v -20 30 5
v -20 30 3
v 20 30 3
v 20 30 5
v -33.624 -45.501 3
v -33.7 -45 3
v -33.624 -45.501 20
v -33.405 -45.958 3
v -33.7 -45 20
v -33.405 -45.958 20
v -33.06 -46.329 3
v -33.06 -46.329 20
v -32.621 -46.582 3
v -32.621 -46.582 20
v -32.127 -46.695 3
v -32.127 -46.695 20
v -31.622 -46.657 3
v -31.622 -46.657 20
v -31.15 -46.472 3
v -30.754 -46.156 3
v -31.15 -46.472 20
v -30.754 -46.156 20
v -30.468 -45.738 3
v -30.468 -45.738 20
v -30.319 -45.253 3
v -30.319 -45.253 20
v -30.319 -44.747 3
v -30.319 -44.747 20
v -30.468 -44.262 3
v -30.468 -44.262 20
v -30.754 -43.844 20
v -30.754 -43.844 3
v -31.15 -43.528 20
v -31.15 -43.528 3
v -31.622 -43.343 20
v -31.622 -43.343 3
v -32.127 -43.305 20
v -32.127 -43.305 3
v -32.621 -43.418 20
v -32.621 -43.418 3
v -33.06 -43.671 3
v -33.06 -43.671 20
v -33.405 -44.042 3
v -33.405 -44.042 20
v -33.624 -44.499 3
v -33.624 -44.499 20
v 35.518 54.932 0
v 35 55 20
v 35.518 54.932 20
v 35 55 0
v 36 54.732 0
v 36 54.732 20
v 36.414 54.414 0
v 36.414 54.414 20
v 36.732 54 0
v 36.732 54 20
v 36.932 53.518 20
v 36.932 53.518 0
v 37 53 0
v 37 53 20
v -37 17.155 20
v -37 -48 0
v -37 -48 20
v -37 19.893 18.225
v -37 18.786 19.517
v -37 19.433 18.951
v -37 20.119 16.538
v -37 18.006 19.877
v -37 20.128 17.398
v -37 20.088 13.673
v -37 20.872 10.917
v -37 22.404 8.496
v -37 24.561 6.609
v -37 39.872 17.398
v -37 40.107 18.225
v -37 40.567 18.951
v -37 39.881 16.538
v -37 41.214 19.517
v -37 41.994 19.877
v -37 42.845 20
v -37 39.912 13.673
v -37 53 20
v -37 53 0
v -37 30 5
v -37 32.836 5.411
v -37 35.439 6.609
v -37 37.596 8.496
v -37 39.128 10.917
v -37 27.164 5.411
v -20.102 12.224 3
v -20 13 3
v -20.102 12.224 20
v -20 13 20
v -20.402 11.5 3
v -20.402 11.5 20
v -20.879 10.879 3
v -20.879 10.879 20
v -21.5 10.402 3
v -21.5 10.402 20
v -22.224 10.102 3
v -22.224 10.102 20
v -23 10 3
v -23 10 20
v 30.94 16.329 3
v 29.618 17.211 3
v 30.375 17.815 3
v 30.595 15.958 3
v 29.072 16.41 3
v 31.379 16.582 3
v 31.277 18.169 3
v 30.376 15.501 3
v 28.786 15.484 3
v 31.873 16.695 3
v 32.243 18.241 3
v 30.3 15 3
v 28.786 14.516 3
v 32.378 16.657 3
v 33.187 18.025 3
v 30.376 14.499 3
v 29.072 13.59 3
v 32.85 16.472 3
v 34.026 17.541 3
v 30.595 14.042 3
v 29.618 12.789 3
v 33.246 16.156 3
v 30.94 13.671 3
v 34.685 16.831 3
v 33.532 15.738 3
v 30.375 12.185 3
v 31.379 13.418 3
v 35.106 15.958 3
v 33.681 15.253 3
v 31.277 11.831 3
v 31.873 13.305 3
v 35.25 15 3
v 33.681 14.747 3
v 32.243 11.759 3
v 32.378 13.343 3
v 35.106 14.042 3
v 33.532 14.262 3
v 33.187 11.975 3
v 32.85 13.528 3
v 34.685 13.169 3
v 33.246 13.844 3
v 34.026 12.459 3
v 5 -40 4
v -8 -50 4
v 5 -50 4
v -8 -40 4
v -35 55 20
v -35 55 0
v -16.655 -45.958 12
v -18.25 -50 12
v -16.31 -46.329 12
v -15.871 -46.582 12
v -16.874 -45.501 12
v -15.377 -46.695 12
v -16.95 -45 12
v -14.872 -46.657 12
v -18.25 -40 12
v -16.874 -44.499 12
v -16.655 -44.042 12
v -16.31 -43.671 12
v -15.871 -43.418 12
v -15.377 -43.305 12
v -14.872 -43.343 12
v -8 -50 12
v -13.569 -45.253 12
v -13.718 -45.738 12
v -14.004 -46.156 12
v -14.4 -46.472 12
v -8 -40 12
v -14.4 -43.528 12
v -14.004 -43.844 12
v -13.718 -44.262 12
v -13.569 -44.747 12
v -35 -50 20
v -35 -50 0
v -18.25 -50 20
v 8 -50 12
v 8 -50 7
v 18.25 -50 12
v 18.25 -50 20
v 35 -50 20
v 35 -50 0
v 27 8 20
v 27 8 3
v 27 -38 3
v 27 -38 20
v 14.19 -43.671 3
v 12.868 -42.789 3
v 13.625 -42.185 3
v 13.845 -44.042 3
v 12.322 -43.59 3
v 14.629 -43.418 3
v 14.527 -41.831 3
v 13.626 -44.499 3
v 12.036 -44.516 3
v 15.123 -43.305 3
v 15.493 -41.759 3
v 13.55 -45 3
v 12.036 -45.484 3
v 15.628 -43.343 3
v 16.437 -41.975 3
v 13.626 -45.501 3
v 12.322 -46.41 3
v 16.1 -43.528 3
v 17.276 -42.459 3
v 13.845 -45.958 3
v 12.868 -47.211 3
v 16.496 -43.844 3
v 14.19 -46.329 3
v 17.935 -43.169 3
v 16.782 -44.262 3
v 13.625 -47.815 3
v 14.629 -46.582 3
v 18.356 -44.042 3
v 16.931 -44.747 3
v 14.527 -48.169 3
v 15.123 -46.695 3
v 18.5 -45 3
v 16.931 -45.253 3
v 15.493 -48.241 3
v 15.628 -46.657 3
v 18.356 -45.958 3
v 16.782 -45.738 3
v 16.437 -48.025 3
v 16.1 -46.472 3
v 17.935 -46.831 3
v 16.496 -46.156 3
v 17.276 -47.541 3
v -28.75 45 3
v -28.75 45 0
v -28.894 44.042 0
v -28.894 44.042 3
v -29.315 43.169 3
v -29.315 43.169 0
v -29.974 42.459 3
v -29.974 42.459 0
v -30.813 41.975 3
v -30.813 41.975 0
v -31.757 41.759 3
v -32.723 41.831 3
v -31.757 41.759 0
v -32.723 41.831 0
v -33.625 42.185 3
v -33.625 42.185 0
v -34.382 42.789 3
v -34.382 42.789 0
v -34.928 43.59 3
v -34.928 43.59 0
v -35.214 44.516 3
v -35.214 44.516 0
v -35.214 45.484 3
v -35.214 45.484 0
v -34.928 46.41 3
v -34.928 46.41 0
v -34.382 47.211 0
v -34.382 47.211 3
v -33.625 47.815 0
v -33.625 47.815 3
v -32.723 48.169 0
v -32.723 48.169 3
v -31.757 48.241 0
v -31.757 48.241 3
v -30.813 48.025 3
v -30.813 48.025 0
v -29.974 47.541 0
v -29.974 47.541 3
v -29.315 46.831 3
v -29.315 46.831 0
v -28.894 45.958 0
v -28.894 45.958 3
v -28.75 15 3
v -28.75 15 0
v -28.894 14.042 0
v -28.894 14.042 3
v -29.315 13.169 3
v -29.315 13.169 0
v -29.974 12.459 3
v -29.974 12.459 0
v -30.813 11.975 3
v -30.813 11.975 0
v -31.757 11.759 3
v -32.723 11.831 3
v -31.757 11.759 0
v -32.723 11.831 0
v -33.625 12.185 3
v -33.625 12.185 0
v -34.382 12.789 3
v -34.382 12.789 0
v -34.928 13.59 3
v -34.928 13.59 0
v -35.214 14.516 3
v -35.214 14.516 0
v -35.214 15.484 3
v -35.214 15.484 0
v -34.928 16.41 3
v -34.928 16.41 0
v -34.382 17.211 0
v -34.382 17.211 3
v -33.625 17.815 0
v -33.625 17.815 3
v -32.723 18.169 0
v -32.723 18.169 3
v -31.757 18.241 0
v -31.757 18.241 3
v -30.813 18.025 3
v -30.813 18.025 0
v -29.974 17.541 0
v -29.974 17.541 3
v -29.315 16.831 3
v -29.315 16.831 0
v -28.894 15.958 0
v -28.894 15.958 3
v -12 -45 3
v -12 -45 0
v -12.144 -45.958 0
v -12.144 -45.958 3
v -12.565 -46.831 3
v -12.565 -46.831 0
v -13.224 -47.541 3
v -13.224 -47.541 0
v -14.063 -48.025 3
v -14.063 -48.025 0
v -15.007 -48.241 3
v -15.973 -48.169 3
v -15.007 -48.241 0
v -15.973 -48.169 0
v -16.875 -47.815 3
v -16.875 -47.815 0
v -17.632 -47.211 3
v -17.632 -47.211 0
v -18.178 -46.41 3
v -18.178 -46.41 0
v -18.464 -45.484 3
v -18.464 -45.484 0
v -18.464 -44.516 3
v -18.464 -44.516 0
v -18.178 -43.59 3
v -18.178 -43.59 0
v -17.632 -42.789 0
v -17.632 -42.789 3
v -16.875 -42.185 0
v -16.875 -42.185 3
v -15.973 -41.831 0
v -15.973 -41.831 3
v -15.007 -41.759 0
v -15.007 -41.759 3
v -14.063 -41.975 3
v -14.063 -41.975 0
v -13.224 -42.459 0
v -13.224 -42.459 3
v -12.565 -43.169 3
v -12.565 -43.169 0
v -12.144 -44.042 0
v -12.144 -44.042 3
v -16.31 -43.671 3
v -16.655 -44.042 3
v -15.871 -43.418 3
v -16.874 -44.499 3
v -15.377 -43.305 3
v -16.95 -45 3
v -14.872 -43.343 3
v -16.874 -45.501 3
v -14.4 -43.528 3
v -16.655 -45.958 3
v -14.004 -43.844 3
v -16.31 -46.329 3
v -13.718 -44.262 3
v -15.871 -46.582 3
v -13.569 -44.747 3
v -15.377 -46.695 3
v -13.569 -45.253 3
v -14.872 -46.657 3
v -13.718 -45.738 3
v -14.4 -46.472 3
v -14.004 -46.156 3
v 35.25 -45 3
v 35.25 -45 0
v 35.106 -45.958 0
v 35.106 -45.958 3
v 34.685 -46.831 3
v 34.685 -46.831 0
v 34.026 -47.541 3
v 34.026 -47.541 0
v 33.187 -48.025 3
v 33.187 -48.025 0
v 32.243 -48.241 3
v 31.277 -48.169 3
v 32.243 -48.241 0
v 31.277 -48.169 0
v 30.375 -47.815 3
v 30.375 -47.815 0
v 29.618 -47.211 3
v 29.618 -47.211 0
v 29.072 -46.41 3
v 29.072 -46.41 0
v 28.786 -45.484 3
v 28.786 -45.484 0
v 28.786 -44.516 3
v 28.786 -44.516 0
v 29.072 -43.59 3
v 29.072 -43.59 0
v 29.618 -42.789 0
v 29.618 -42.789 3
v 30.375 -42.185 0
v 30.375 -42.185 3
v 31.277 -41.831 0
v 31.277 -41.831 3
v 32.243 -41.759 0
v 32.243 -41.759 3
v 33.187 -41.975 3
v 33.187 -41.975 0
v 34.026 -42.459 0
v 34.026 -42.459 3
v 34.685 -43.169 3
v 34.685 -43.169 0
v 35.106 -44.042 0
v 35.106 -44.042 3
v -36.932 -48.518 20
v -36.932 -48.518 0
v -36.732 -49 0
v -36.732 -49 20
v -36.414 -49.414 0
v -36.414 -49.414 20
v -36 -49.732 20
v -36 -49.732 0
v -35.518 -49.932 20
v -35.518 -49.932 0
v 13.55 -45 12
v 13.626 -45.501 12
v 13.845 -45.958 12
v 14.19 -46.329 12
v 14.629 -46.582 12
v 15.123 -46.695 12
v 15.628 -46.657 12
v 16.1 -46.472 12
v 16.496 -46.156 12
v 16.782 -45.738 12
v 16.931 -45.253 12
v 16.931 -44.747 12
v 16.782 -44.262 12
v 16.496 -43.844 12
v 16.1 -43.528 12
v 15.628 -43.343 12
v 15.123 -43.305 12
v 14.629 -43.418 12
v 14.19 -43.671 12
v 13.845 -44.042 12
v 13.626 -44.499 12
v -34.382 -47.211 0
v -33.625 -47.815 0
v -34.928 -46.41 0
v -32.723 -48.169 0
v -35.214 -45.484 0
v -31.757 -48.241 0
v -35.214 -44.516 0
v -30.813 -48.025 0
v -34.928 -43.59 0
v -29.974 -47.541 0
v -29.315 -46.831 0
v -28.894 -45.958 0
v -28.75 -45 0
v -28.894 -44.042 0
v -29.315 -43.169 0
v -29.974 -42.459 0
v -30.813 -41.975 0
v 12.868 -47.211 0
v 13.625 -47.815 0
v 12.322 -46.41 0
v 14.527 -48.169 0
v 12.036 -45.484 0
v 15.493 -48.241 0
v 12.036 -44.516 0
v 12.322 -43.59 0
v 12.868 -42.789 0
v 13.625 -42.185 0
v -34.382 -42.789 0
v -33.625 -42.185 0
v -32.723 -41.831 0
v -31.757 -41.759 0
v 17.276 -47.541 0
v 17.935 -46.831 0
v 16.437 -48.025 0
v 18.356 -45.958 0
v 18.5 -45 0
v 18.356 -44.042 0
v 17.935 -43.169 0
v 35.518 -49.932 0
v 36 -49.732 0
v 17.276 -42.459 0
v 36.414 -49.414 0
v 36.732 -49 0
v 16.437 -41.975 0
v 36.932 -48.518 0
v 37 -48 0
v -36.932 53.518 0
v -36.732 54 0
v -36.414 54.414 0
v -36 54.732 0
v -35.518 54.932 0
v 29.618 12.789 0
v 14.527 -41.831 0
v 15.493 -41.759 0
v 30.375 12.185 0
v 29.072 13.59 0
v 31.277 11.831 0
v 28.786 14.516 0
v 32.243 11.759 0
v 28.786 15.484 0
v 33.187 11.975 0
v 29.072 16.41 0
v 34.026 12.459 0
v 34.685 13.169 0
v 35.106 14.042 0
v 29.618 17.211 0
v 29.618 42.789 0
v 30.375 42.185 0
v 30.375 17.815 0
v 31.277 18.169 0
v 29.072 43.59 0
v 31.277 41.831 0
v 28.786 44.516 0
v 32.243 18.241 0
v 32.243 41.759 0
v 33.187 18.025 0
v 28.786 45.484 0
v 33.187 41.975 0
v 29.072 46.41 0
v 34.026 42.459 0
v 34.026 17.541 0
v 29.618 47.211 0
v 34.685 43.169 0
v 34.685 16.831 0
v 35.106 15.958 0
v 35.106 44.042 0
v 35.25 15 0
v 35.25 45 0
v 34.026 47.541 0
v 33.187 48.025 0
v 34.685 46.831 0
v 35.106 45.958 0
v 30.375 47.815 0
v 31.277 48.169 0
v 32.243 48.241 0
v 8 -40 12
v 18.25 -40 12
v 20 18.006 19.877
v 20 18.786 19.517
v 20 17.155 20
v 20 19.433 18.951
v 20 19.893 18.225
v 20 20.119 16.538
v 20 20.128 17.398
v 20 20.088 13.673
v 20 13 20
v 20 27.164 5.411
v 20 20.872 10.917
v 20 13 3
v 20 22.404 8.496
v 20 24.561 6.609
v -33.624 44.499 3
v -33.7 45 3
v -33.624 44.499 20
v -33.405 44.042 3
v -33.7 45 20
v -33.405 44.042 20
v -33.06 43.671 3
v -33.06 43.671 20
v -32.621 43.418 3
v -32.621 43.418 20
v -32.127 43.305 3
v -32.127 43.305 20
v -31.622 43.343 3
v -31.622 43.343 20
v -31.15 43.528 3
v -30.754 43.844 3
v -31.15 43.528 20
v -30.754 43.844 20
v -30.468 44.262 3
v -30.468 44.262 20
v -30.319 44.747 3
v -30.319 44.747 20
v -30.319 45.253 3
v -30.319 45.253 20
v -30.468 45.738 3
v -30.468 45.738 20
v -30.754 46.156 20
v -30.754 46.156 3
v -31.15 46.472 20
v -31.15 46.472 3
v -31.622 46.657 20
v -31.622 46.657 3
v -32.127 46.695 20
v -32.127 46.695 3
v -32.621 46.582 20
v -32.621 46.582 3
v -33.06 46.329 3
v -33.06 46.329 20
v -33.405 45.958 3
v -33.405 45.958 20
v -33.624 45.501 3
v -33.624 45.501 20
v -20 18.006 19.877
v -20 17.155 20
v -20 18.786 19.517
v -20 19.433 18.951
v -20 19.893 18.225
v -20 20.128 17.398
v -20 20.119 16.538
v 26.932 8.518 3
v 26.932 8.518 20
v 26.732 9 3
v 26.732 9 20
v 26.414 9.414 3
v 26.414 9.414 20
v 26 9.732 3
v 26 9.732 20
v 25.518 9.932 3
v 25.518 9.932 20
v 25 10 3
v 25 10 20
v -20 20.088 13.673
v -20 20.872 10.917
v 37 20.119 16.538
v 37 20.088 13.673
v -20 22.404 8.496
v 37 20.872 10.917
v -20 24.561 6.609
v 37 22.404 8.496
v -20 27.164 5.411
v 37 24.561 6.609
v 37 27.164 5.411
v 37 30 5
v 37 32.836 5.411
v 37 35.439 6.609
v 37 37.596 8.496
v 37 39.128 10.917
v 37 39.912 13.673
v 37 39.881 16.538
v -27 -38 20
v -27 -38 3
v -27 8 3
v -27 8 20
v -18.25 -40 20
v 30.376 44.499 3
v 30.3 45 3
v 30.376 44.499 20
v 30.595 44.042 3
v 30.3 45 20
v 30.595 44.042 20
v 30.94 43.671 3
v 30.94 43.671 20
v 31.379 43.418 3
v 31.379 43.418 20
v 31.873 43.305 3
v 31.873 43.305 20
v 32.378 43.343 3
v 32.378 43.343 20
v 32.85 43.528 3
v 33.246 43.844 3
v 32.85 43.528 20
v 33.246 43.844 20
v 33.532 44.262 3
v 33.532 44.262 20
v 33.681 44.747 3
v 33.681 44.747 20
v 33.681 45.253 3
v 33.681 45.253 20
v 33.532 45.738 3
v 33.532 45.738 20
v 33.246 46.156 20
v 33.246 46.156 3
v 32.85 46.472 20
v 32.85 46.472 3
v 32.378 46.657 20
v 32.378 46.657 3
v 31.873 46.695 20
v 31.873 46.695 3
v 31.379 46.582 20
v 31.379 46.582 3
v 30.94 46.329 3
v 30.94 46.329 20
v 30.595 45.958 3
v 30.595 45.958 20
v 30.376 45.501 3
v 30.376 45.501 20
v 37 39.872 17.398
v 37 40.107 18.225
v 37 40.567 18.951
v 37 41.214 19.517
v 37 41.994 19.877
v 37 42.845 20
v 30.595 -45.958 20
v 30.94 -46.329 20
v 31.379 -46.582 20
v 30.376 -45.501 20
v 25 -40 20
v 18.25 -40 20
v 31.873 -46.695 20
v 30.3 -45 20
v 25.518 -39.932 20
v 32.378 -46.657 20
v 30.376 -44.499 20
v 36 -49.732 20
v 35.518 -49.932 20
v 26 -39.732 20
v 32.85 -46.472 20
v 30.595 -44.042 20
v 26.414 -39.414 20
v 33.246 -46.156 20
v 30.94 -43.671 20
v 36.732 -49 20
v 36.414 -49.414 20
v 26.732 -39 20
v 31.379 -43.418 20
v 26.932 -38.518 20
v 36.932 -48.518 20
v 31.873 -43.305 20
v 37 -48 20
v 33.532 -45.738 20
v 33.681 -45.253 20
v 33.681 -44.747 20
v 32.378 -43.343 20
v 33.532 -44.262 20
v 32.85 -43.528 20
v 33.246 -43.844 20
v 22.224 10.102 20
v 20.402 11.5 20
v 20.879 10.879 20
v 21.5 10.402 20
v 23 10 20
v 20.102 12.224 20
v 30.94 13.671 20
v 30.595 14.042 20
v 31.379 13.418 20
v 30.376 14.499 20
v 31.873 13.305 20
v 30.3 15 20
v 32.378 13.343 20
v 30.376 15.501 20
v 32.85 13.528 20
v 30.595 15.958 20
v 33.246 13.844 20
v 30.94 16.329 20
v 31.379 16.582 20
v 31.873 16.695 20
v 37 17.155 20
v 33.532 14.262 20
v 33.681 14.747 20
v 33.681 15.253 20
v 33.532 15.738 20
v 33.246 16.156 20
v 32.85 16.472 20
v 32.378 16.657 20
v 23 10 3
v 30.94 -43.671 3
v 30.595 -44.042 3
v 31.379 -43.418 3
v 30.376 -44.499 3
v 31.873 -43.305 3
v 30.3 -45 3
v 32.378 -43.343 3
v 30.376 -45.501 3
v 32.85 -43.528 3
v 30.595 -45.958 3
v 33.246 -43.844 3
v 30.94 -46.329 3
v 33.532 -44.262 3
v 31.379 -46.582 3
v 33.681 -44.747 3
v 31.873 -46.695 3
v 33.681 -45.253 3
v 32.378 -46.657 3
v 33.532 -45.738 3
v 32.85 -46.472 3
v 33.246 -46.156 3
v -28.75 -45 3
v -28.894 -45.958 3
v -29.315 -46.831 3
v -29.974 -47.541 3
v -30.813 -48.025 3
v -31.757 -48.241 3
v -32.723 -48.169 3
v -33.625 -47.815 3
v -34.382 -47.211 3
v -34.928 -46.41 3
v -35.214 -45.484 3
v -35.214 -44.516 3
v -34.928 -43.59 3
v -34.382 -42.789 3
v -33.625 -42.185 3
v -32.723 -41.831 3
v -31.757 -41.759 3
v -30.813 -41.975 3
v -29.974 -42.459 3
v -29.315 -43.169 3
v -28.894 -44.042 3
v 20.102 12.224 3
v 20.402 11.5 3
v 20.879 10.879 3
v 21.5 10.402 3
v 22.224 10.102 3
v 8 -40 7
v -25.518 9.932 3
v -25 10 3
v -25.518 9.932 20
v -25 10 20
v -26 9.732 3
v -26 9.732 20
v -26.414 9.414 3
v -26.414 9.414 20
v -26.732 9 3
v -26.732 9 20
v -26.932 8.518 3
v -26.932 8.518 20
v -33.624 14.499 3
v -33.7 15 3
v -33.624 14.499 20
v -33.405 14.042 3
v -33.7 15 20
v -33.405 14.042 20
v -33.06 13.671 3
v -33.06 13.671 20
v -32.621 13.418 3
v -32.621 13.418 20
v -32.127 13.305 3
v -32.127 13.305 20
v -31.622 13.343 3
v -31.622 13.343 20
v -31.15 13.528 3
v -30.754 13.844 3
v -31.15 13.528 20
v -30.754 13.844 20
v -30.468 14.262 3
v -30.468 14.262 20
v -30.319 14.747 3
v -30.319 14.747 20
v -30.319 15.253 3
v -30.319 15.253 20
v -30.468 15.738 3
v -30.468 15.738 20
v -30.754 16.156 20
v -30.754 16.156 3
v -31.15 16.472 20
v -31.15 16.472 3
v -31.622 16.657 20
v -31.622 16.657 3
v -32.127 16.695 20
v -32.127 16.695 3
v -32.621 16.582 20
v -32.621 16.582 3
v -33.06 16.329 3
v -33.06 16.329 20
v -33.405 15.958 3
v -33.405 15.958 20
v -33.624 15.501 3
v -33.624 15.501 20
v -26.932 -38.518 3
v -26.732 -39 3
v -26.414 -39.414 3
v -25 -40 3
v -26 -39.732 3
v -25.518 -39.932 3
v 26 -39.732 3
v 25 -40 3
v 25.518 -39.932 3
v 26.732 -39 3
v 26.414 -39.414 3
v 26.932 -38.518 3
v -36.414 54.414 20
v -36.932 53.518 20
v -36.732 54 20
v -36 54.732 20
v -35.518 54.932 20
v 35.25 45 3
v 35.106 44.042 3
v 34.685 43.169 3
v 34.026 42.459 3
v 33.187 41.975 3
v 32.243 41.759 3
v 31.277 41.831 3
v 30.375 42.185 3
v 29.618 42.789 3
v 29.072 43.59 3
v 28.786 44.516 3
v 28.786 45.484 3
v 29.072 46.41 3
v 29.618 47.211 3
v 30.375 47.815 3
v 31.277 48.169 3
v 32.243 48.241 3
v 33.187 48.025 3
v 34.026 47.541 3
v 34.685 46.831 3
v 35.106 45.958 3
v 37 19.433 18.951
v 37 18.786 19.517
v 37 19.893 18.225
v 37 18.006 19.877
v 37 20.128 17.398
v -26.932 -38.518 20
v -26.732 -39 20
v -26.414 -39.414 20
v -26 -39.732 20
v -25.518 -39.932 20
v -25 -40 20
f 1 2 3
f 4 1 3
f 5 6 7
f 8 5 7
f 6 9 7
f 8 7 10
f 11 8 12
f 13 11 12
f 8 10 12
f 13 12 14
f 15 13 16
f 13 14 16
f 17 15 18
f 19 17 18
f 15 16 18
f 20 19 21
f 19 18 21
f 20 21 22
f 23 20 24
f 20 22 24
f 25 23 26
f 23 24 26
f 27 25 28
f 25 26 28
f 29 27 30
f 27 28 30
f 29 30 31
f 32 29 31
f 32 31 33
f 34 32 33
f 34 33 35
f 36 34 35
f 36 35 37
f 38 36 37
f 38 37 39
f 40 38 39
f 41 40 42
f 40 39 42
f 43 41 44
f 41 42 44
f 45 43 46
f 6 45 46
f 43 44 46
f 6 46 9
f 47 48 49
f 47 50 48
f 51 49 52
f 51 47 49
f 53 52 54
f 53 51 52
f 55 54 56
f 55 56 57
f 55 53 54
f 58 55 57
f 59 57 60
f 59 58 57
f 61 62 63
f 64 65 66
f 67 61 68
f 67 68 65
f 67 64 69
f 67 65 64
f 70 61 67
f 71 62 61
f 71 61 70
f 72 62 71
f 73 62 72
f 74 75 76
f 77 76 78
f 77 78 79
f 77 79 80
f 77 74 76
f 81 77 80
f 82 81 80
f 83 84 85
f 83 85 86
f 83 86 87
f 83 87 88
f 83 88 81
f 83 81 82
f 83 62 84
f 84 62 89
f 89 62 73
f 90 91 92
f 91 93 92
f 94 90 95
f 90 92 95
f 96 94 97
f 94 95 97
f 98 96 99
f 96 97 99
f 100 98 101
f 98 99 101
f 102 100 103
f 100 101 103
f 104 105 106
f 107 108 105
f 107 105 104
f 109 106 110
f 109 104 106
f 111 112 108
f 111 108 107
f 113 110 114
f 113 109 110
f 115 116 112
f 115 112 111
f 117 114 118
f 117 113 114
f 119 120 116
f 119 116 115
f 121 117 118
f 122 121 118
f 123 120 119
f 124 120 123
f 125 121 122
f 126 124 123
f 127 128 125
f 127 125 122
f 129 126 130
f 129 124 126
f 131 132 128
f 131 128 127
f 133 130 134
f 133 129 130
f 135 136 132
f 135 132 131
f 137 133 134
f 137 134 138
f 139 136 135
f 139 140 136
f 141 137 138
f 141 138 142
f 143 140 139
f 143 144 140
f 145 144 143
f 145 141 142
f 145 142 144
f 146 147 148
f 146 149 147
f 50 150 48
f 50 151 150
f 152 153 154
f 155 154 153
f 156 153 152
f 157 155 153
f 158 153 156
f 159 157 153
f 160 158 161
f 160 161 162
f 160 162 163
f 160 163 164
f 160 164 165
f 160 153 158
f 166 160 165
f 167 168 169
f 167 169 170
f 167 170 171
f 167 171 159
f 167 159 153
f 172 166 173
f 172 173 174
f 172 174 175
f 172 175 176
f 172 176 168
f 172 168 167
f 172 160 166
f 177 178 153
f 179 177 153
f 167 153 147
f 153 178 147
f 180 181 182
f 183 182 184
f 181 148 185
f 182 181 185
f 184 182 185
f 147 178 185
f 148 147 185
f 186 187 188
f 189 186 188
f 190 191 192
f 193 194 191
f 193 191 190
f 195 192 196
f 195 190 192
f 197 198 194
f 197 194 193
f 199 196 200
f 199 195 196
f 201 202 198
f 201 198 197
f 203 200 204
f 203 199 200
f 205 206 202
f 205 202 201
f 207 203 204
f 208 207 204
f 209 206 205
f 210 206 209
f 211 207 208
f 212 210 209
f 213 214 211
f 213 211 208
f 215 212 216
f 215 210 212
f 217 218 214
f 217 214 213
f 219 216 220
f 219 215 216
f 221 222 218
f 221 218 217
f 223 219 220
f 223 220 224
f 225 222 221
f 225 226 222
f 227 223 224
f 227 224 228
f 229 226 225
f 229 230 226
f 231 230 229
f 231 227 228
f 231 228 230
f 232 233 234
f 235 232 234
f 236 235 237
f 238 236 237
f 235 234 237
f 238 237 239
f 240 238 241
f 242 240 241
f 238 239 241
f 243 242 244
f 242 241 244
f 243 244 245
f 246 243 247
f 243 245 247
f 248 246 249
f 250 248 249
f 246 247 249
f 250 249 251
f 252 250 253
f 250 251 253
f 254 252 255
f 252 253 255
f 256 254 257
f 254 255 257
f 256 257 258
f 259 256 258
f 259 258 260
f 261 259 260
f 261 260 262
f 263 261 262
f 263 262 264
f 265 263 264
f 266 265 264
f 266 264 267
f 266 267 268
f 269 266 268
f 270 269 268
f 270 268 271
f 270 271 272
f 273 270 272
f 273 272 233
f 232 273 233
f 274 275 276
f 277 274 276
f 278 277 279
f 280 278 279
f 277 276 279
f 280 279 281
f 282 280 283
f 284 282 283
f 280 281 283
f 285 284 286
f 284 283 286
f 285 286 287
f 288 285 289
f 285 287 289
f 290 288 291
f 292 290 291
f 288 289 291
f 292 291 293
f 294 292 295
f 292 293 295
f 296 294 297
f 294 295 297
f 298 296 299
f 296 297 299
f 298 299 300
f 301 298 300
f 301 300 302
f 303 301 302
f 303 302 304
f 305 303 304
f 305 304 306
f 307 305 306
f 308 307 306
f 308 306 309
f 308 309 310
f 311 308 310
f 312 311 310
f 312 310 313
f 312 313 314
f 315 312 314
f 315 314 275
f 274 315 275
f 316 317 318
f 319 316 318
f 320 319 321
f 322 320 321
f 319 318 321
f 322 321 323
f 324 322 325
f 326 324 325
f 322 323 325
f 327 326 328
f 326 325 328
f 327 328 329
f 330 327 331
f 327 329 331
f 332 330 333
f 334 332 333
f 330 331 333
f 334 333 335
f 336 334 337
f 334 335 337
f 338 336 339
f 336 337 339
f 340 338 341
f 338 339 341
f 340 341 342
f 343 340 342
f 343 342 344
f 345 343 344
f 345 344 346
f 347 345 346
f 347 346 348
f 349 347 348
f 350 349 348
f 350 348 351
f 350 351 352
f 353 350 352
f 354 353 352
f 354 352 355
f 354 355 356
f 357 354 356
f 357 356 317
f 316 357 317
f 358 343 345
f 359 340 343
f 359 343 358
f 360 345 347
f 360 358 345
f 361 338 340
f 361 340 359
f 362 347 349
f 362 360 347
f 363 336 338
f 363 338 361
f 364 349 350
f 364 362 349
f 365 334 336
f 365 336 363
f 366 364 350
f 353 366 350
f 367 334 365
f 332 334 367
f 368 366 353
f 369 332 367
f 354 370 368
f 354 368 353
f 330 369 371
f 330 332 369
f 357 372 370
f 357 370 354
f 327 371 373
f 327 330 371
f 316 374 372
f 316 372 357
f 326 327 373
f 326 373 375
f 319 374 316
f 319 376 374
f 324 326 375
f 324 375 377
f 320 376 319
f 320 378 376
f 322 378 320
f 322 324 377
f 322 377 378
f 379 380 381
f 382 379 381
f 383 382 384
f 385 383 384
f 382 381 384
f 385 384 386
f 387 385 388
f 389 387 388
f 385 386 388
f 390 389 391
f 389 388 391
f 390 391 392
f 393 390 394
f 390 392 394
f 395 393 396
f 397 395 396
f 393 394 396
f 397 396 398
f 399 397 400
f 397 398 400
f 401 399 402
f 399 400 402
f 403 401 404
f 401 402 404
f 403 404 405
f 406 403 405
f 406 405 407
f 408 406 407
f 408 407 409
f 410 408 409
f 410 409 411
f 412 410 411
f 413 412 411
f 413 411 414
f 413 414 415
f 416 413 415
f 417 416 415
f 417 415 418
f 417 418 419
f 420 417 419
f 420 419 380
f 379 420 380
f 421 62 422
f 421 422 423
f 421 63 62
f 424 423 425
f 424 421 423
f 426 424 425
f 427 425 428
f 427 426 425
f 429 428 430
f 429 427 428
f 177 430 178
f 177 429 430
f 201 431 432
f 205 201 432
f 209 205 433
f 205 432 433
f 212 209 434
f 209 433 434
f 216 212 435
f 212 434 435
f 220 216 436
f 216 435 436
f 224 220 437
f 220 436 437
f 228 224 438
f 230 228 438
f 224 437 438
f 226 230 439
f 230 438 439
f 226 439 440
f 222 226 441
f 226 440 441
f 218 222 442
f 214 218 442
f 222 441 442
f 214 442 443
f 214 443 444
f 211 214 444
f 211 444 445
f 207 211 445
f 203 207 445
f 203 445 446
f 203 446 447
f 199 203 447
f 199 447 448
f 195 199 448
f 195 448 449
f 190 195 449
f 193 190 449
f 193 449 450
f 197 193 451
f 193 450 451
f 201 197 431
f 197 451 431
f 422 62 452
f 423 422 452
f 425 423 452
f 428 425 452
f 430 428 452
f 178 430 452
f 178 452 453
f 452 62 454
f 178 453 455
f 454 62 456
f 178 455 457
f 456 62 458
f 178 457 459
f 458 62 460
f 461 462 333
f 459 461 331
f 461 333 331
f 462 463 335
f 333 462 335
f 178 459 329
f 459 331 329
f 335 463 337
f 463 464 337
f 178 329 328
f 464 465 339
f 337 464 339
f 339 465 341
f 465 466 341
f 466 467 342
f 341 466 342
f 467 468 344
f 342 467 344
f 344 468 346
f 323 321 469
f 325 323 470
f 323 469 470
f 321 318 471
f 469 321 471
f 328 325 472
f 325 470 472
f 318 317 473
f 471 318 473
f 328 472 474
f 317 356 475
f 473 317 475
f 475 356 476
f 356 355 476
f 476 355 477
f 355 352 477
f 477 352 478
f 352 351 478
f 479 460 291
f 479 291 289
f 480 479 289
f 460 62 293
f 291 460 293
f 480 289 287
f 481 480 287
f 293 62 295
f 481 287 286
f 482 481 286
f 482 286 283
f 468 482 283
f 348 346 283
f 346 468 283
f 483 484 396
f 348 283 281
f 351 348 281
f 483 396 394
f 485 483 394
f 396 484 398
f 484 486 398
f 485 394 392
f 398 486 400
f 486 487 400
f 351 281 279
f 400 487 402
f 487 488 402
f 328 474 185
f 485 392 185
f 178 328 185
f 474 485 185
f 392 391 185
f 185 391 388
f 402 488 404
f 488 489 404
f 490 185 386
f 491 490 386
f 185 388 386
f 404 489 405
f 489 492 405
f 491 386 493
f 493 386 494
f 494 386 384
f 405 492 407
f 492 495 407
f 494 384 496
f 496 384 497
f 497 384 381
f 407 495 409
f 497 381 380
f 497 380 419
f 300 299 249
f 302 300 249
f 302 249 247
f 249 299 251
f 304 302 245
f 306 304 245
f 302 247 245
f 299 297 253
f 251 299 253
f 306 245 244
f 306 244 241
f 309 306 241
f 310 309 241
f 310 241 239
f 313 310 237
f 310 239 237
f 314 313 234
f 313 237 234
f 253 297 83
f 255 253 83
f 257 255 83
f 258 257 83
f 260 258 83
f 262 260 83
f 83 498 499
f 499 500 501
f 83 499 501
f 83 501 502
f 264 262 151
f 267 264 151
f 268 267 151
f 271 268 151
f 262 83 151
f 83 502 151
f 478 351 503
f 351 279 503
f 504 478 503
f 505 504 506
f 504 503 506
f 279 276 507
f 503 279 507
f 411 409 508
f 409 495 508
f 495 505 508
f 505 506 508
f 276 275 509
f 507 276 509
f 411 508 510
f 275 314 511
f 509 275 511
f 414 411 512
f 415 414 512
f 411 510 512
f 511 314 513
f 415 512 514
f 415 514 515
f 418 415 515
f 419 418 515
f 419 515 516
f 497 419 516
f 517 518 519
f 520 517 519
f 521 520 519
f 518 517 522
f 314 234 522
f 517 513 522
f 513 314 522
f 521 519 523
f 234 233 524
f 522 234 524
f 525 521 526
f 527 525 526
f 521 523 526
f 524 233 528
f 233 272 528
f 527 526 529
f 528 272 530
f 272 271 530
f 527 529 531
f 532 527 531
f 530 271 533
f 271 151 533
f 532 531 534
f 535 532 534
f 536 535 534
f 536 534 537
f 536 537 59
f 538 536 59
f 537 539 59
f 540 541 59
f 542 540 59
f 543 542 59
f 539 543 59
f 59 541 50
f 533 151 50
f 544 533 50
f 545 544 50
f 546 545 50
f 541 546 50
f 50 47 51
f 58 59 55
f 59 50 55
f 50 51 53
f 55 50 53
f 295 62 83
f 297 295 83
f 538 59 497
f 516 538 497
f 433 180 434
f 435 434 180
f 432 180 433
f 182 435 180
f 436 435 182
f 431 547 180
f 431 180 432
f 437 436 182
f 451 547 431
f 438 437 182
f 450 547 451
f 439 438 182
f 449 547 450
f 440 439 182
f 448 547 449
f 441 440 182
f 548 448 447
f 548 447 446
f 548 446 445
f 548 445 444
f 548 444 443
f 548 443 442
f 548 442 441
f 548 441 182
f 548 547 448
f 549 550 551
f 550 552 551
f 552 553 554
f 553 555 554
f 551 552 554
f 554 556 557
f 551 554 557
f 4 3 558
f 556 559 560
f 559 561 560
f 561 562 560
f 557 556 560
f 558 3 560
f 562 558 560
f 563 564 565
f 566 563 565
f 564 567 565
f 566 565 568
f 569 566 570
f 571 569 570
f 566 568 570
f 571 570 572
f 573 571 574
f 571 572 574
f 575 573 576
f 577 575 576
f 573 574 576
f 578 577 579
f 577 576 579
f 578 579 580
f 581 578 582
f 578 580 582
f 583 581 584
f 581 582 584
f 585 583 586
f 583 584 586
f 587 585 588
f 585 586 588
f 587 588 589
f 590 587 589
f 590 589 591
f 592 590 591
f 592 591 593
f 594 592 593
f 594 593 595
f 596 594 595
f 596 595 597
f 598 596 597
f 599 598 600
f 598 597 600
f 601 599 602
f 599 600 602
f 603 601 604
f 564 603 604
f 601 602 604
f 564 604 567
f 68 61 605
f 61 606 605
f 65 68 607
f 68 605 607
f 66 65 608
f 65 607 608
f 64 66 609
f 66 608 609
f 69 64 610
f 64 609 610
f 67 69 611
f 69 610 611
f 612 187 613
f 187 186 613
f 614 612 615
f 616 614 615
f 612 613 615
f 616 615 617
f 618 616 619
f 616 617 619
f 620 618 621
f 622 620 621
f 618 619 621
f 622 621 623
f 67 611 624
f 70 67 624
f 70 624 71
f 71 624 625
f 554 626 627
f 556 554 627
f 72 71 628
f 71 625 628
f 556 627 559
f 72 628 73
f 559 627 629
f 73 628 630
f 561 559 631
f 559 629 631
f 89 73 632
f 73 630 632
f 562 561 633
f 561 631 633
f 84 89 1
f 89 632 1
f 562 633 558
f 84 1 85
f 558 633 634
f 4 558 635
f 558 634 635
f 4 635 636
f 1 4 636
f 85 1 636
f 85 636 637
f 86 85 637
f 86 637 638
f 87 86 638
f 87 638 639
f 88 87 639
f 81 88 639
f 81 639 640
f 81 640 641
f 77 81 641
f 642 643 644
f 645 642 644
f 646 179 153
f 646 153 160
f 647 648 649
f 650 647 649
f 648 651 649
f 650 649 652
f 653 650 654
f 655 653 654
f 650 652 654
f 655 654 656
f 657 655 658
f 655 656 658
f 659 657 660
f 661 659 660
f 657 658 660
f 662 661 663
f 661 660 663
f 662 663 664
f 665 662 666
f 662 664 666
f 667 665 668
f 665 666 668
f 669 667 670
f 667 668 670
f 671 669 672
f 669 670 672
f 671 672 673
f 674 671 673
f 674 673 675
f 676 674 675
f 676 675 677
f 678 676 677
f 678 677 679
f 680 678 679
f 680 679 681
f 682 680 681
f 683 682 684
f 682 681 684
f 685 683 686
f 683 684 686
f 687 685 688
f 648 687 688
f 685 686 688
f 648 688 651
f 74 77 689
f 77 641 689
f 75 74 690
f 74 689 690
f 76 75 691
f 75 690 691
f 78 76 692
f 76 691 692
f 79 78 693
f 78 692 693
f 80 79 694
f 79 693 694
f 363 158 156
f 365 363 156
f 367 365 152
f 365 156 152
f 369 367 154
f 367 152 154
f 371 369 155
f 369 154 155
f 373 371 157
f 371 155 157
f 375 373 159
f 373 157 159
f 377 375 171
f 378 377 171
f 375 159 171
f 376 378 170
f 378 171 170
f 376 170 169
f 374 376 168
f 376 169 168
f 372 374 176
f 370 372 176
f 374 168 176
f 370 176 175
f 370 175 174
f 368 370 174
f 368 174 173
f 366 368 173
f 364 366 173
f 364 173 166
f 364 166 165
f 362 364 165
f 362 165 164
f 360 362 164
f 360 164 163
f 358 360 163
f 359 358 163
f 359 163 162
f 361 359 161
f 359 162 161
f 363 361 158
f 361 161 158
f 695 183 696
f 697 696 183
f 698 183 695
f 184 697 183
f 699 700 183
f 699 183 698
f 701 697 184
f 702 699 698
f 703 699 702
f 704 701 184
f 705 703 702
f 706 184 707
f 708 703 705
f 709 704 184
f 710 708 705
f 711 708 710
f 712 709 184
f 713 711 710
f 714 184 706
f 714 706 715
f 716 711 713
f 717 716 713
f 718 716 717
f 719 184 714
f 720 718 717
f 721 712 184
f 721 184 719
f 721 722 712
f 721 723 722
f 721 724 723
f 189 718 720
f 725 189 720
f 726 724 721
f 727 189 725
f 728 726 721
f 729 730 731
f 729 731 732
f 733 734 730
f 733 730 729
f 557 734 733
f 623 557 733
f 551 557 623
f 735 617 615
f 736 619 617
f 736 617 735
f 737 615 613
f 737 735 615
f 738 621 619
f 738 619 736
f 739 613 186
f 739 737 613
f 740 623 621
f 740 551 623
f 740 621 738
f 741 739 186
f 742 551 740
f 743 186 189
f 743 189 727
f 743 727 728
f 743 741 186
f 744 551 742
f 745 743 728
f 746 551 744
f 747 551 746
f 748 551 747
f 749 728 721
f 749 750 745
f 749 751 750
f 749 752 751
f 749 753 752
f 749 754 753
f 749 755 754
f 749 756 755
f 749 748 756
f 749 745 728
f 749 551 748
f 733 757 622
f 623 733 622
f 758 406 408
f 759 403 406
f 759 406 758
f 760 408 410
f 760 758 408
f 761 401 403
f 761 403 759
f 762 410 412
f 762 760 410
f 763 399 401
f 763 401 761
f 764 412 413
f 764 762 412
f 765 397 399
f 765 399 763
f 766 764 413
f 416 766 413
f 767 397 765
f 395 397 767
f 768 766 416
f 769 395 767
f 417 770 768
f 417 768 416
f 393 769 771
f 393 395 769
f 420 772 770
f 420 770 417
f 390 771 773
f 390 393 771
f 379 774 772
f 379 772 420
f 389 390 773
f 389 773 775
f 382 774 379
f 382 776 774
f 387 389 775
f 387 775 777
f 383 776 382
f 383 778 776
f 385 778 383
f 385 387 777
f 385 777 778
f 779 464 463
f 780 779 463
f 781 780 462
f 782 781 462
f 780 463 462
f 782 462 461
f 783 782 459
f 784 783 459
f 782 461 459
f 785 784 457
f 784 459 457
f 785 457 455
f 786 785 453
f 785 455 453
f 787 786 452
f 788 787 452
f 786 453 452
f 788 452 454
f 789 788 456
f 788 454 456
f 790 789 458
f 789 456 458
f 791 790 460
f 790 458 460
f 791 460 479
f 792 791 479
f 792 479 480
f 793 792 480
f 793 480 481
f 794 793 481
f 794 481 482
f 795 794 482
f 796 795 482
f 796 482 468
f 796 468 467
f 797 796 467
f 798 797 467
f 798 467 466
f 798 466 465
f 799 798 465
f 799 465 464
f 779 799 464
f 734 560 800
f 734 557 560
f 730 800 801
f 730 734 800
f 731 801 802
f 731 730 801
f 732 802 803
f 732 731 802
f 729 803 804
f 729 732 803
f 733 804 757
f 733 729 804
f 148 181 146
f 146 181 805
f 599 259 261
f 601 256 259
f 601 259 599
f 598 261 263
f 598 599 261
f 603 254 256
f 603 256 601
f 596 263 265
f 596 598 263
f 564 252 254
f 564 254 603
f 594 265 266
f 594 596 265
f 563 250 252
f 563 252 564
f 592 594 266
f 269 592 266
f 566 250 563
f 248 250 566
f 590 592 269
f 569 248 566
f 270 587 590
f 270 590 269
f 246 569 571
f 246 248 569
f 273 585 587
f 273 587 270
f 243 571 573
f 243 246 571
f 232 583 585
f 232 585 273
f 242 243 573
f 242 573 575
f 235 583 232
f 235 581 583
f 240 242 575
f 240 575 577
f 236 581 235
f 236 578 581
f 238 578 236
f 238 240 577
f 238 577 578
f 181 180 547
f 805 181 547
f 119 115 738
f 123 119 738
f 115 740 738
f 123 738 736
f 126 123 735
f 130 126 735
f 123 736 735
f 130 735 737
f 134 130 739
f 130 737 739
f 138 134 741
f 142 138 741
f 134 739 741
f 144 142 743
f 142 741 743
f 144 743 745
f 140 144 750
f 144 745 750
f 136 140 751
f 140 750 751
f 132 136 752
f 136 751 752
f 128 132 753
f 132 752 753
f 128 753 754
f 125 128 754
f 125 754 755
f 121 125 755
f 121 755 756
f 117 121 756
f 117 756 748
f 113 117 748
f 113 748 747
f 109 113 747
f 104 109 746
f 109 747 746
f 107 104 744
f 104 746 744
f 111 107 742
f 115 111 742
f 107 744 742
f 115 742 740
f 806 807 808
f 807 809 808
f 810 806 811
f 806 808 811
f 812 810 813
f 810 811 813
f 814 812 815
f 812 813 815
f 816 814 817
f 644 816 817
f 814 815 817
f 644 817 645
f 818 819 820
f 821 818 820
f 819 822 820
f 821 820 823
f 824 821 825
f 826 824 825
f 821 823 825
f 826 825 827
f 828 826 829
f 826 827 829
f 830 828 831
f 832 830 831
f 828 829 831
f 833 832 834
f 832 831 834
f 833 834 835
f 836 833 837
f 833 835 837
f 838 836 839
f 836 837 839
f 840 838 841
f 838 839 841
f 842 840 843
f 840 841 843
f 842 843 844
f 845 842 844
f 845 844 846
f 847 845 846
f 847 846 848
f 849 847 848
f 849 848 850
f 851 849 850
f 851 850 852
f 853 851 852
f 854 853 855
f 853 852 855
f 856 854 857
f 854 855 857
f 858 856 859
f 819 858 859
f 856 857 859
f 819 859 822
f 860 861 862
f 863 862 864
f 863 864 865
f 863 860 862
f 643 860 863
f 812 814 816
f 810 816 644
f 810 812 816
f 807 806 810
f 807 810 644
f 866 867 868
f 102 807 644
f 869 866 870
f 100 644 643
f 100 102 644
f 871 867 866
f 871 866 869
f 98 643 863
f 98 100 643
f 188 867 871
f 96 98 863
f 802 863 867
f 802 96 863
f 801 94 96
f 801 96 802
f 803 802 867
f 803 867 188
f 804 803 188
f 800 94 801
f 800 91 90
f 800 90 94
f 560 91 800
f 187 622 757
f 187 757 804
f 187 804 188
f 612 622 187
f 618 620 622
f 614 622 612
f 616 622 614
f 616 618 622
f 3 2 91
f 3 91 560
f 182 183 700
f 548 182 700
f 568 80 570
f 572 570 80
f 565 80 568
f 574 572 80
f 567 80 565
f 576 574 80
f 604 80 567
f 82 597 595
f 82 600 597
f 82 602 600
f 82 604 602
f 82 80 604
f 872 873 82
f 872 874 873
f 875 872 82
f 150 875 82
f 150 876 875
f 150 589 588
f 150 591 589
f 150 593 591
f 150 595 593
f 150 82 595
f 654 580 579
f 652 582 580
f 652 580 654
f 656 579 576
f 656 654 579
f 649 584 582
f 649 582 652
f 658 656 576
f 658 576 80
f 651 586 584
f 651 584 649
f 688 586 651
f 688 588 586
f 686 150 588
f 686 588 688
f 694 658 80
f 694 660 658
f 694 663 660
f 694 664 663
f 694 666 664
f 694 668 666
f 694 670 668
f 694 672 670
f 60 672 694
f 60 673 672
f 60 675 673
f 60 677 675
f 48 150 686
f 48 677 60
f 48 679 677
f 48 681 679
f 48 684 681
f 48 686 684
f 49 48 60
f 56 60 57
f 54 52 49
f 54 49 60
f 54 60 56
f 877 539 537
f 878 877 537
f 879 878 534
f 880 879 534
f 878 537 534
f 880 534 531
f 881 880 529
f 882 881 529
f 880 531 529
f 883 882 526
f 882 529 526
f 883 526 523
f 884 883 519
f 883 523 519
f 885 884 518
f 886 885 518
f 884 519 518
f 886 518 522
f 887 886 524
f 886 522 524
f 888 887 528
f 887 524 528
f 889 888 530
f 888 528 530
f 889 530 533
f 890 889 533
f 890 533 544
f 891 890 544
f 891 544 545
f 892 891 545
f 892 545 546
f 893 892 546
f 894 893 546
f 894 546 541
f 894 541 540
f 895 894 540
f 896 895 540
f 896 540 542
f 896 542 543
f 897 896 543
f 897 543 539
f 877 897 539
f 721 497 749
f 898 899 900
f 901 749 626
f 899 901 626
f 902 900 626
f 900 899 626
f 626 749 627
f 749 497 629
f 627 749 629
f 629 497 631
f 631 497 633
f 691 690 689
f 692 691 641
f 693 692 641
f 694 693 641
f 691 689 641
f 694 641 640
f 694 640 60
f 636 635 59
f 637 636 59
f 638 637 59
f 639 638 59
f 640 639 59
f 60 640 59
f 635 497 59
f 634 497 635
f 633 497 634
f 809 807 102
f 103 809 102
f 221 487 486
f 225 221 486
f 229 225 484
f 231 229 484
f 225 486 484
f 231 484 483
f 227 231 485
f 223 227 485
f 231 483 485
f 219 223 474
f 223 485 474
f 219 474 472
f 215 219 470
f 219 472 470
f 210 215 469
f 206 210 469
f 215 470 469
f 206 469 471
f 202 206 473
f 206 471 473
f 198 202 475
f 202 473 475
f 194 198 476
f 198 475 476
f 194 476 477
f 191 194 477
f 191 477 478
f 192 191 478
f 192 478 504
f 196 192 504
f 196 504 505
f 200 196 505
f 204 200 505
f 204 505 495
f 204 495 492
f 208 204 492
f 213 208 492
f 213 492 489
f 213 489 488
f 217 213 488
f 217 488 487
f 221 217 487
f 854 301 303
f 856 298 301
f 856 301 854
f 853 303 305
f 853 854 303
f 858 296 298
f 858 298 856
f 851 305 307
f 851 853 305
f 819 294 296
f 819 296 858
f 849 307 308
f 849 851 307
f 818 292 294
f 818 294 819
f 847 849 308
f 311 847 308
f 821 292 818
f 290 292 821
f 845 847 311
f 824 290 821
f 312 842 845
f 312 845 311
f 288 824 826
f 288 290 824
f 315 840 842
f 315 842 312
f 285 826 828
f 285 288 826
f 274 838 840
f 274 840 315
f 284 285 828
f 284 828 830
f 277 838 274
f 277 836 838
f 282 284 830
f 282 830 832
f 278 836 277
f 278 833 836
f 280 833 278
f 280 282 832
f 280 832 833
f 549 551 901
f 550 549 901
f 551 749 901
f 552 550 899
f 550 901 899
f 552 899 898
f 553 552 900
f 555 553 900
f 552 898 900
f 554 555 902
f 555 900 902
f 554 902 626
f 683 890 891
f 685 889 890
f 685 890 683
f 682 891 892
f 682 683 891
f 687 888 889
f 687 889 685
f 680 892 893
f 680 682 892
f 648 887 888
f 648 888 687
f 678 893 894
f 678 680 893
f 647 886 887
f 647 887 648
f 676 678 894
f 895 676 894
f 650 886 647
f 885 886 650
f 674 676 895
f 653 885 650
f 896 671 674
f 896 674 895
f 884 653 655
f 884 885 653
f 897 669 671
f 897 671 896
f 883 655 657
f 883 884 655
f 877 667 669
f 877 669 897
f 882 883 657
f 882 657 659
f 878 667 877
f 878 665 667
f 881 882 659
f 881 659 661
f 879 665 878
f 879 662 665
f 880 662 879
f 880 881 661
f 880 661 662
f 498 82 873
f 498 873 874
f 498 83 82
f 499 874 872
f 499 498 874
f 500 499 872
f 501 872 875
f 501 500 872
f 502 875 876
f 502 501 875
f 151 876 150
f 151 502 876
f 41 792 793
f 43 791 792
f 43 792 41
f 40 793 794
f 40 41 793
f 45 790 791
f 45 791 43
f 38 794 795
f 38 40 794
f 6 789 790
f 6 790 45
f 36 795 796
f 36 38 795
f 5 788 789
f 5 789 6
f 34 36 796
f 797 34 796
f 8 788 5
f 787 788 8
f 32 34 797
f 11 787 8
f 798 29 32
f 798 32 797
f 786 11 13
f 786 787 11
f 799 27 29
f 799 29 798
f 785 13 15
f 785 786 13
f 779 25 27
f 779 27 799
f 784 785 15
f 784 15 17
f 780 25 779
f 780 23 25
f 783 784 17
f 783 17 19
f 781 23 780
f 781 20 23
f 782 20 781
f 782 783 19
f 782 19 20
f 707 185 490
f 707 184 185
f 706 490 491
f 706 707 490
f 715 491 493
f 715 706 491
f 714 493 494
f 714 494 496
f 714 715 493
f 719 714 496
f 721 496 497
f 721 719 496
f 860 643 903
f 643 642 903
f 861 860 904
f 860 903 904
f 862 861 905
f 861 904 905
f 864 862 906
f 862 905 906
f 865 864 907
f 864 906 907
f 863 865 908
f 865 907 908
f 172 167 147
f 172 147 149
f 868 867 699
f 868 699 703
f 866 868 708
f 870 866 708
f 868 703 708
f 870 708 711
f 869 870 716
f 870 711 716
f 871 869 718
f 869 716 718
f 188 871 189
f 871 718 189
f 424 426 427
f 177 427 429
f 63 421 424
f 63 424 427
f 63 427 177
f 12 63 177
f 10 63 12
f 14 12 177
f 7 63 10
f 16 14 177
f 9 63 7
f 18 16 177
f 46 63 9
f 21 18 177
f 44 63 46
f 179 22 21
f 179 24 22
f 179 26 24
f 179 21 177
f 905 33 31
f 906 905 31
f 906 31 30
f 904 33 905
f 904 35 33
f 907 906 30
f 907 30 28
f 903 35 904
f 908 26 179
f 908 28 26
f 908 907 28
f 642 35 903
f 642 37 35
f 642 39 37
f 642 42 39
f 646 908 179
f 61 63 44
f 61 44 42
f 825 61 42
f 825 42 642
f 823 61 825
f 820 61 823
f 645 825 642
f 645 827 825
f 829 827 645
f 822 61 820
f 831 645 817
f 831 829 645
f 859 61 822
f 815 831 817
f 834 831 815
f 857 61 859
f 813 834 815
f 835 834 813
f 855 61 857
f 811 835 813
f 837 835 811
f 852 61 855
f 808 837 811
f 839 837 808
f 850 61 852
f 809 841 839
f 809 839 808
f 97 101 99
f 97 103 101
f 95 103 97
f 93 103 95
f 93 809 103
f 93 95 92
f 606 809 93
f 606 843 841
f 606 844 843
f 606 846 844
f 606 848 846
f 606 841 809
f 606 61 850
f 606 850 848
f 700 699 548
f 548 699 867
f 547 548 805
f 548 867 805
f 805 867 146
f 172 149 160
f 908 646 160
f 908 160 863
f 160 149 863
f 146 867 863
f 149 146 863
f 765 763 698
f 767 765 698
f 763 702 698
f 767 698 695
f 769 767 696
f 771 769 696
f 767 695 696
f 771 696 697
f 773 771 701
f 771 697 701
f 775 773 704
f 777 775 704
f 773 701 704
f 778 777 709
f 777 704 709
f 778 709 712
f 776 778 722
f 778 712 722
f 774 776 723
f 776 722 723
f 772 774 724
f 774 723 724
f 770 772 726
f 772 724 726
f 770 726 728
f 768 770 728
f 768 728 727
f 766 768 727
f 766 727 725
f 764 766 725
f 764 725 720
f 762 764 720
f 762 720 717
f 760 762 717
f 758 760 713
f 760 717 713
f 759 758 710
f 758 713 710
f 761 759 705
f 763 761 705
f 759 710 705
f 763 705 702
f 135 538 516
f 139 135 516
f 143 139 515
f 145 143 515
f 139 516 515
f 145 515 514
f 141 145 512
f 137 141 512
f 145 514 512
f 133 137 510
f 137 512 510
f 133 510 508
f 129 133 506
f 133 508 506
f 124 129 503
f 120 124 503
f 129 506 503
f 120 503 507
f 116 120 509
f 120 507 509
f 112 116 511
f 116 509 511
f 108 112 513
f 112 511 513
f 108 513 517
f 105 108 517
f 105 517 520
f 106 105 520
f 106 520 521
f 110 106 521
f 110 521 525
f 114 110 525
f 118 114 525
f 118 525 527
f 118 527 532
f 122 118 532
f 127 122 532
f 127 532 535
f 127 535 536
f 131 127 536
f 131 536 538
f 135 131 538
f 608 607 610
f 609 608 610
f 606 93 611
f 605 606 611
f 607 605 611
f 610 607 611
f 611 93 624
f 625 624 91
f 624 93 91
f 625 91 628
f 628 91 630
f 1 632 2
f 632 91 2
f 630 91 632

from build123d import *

# Parameters (mm, degrees)
F1_W           = 74
F1_H           = 105
F2_DEPTH       = 3
F3_W           = 74
F3_H           = 105
F4_DEPTH       = 17
F5_R           = 10
F6_DEPTH       = 74.001
F8_D           = 3.4
F8_CBORE_D     = 6.5
F8_CBORE_DEPTH = 3
F9_R           = 2
F10_R          = 3
F11_R          = 2
F12_W          = 36.5
F12_H          = 10
F12_R          = 1.7
F13_DEPTH      = 8
F14_W          = 16
F14_H          = 10
F15_DEPTH      = 16
F16_SIZE       = 3
F17_R          = 3


with BuildPart() as f2:
    # F1 (on face) → F2 (new body)
    with BuildSketch(Plane.XY):
        with Locations((0, 2.5)):
            Rectangle(F1_W, F1_H)
    extrude(amount=F2_DEPTH)

    # F3 (on face) → F4 (join)
    with BuildSketch(Plane.XY.offset(3)):
        with Locations((0, 2.5)):
            Rectangle(F3_W, F3_H)
        Polygon((20, 10), (27, 10), (27, -40), (-27, -40), (-27, 10), (-20, 10), (-20, 30), (20, 30), align=None, mode=Mode.SUBTRACT)
    extrude(amount=F4_DEPTH)

    # F5 (on face) → F6 (cut, through all)
    with BuildSketch(Plane.YZ.offset(37)):
        with Locations((30, 15)):
            Circle(F5_R)
    extrude(amount=-F6_DEPTH, mode=Mode.SUBTRACT)

    # F8 (through all)
    with Locations(Plane(origin=(0, 0, 0), x_dir=(1, 0, 0), z_dir=(0, 0, -1))):
        with Locations((32, -15), (32, -45), (-32, -45), (-32, -15), (32, 45), (-32, 45), (-15.25, 45), (15.25, 45)):
            CounterBoreHole(F8_D / 2, F8_CBORE_D / 2, F8_CBORE_DEPTH)

    # F9
    f9_edges = [f2.edges().sort_by_distance(p)[0] for p in [
        (37, 55, 10),
        (-37, 55, 10),
        (37, -50, 10),
        (-37, -50, 10),
    ]]
    fillet(f9_edges, radius=F9_R)

    # F10
    f10_edges = [f2.edges().sort_by_distance(p)[0] for p in [
        (-20, 10, 11.5),
        (20, 10, 11.5),
    ]]
    fillet(f10_edges, radius=F10_R)

    # F11
    f11_edges = [f2.edges().sort_by_distance(p)[0] for p in [
        (27, 10, 11.5),
        (-27, 10, 11.5),
        (-27, -40, 11.5),
        (27, -40, 11.5),
    ]]
    fillet(f11_edges, radius=F11_R)

    # F12 (on face) → F13 (cut)
    with BuildSketch(Plane.XY.offset(20)):
        with Locations((0, -45)):
            Rectangle(F12_W, F12_H)
        with Locations((-15.25, -45)):
            Circle(F12_R, mode=Mode.SUBTRACT)
        with Locations((15.25, -45)):
            Circle(F12_R, mode=Mode.SUBTRACT)
    extrude(amount=-F13_DEPTH, mode=Mode.SUBTRACT)

    # F14 (on face) → F15 (cut)
    with BuildSketch(Plane.XY.offset(20)):
        with Locations((0, -45)):
            Rectangle(F14_W, F14_H)
    extrude(amount=-F15_DEPTH, mode=Mode.SUBTRACT)

    # F16
    f16_edges = [f2.edges().sort_by_distance(p)[0] for p in [
        (8, -45, 4),
    ]]
    chamfer(f16_edges, length=F16_SIZE)

    # F17
    f17_edges = [f2.edges().sort_by_distance(p)[0] for p in [
        (0, 38.660254, 20),
        (-28.5, 21.339746, 20),
        (28.5, 21.339746, 20),
    ]]
    fillet(f17_edges, radius=F17_R)


solid = f2.part
